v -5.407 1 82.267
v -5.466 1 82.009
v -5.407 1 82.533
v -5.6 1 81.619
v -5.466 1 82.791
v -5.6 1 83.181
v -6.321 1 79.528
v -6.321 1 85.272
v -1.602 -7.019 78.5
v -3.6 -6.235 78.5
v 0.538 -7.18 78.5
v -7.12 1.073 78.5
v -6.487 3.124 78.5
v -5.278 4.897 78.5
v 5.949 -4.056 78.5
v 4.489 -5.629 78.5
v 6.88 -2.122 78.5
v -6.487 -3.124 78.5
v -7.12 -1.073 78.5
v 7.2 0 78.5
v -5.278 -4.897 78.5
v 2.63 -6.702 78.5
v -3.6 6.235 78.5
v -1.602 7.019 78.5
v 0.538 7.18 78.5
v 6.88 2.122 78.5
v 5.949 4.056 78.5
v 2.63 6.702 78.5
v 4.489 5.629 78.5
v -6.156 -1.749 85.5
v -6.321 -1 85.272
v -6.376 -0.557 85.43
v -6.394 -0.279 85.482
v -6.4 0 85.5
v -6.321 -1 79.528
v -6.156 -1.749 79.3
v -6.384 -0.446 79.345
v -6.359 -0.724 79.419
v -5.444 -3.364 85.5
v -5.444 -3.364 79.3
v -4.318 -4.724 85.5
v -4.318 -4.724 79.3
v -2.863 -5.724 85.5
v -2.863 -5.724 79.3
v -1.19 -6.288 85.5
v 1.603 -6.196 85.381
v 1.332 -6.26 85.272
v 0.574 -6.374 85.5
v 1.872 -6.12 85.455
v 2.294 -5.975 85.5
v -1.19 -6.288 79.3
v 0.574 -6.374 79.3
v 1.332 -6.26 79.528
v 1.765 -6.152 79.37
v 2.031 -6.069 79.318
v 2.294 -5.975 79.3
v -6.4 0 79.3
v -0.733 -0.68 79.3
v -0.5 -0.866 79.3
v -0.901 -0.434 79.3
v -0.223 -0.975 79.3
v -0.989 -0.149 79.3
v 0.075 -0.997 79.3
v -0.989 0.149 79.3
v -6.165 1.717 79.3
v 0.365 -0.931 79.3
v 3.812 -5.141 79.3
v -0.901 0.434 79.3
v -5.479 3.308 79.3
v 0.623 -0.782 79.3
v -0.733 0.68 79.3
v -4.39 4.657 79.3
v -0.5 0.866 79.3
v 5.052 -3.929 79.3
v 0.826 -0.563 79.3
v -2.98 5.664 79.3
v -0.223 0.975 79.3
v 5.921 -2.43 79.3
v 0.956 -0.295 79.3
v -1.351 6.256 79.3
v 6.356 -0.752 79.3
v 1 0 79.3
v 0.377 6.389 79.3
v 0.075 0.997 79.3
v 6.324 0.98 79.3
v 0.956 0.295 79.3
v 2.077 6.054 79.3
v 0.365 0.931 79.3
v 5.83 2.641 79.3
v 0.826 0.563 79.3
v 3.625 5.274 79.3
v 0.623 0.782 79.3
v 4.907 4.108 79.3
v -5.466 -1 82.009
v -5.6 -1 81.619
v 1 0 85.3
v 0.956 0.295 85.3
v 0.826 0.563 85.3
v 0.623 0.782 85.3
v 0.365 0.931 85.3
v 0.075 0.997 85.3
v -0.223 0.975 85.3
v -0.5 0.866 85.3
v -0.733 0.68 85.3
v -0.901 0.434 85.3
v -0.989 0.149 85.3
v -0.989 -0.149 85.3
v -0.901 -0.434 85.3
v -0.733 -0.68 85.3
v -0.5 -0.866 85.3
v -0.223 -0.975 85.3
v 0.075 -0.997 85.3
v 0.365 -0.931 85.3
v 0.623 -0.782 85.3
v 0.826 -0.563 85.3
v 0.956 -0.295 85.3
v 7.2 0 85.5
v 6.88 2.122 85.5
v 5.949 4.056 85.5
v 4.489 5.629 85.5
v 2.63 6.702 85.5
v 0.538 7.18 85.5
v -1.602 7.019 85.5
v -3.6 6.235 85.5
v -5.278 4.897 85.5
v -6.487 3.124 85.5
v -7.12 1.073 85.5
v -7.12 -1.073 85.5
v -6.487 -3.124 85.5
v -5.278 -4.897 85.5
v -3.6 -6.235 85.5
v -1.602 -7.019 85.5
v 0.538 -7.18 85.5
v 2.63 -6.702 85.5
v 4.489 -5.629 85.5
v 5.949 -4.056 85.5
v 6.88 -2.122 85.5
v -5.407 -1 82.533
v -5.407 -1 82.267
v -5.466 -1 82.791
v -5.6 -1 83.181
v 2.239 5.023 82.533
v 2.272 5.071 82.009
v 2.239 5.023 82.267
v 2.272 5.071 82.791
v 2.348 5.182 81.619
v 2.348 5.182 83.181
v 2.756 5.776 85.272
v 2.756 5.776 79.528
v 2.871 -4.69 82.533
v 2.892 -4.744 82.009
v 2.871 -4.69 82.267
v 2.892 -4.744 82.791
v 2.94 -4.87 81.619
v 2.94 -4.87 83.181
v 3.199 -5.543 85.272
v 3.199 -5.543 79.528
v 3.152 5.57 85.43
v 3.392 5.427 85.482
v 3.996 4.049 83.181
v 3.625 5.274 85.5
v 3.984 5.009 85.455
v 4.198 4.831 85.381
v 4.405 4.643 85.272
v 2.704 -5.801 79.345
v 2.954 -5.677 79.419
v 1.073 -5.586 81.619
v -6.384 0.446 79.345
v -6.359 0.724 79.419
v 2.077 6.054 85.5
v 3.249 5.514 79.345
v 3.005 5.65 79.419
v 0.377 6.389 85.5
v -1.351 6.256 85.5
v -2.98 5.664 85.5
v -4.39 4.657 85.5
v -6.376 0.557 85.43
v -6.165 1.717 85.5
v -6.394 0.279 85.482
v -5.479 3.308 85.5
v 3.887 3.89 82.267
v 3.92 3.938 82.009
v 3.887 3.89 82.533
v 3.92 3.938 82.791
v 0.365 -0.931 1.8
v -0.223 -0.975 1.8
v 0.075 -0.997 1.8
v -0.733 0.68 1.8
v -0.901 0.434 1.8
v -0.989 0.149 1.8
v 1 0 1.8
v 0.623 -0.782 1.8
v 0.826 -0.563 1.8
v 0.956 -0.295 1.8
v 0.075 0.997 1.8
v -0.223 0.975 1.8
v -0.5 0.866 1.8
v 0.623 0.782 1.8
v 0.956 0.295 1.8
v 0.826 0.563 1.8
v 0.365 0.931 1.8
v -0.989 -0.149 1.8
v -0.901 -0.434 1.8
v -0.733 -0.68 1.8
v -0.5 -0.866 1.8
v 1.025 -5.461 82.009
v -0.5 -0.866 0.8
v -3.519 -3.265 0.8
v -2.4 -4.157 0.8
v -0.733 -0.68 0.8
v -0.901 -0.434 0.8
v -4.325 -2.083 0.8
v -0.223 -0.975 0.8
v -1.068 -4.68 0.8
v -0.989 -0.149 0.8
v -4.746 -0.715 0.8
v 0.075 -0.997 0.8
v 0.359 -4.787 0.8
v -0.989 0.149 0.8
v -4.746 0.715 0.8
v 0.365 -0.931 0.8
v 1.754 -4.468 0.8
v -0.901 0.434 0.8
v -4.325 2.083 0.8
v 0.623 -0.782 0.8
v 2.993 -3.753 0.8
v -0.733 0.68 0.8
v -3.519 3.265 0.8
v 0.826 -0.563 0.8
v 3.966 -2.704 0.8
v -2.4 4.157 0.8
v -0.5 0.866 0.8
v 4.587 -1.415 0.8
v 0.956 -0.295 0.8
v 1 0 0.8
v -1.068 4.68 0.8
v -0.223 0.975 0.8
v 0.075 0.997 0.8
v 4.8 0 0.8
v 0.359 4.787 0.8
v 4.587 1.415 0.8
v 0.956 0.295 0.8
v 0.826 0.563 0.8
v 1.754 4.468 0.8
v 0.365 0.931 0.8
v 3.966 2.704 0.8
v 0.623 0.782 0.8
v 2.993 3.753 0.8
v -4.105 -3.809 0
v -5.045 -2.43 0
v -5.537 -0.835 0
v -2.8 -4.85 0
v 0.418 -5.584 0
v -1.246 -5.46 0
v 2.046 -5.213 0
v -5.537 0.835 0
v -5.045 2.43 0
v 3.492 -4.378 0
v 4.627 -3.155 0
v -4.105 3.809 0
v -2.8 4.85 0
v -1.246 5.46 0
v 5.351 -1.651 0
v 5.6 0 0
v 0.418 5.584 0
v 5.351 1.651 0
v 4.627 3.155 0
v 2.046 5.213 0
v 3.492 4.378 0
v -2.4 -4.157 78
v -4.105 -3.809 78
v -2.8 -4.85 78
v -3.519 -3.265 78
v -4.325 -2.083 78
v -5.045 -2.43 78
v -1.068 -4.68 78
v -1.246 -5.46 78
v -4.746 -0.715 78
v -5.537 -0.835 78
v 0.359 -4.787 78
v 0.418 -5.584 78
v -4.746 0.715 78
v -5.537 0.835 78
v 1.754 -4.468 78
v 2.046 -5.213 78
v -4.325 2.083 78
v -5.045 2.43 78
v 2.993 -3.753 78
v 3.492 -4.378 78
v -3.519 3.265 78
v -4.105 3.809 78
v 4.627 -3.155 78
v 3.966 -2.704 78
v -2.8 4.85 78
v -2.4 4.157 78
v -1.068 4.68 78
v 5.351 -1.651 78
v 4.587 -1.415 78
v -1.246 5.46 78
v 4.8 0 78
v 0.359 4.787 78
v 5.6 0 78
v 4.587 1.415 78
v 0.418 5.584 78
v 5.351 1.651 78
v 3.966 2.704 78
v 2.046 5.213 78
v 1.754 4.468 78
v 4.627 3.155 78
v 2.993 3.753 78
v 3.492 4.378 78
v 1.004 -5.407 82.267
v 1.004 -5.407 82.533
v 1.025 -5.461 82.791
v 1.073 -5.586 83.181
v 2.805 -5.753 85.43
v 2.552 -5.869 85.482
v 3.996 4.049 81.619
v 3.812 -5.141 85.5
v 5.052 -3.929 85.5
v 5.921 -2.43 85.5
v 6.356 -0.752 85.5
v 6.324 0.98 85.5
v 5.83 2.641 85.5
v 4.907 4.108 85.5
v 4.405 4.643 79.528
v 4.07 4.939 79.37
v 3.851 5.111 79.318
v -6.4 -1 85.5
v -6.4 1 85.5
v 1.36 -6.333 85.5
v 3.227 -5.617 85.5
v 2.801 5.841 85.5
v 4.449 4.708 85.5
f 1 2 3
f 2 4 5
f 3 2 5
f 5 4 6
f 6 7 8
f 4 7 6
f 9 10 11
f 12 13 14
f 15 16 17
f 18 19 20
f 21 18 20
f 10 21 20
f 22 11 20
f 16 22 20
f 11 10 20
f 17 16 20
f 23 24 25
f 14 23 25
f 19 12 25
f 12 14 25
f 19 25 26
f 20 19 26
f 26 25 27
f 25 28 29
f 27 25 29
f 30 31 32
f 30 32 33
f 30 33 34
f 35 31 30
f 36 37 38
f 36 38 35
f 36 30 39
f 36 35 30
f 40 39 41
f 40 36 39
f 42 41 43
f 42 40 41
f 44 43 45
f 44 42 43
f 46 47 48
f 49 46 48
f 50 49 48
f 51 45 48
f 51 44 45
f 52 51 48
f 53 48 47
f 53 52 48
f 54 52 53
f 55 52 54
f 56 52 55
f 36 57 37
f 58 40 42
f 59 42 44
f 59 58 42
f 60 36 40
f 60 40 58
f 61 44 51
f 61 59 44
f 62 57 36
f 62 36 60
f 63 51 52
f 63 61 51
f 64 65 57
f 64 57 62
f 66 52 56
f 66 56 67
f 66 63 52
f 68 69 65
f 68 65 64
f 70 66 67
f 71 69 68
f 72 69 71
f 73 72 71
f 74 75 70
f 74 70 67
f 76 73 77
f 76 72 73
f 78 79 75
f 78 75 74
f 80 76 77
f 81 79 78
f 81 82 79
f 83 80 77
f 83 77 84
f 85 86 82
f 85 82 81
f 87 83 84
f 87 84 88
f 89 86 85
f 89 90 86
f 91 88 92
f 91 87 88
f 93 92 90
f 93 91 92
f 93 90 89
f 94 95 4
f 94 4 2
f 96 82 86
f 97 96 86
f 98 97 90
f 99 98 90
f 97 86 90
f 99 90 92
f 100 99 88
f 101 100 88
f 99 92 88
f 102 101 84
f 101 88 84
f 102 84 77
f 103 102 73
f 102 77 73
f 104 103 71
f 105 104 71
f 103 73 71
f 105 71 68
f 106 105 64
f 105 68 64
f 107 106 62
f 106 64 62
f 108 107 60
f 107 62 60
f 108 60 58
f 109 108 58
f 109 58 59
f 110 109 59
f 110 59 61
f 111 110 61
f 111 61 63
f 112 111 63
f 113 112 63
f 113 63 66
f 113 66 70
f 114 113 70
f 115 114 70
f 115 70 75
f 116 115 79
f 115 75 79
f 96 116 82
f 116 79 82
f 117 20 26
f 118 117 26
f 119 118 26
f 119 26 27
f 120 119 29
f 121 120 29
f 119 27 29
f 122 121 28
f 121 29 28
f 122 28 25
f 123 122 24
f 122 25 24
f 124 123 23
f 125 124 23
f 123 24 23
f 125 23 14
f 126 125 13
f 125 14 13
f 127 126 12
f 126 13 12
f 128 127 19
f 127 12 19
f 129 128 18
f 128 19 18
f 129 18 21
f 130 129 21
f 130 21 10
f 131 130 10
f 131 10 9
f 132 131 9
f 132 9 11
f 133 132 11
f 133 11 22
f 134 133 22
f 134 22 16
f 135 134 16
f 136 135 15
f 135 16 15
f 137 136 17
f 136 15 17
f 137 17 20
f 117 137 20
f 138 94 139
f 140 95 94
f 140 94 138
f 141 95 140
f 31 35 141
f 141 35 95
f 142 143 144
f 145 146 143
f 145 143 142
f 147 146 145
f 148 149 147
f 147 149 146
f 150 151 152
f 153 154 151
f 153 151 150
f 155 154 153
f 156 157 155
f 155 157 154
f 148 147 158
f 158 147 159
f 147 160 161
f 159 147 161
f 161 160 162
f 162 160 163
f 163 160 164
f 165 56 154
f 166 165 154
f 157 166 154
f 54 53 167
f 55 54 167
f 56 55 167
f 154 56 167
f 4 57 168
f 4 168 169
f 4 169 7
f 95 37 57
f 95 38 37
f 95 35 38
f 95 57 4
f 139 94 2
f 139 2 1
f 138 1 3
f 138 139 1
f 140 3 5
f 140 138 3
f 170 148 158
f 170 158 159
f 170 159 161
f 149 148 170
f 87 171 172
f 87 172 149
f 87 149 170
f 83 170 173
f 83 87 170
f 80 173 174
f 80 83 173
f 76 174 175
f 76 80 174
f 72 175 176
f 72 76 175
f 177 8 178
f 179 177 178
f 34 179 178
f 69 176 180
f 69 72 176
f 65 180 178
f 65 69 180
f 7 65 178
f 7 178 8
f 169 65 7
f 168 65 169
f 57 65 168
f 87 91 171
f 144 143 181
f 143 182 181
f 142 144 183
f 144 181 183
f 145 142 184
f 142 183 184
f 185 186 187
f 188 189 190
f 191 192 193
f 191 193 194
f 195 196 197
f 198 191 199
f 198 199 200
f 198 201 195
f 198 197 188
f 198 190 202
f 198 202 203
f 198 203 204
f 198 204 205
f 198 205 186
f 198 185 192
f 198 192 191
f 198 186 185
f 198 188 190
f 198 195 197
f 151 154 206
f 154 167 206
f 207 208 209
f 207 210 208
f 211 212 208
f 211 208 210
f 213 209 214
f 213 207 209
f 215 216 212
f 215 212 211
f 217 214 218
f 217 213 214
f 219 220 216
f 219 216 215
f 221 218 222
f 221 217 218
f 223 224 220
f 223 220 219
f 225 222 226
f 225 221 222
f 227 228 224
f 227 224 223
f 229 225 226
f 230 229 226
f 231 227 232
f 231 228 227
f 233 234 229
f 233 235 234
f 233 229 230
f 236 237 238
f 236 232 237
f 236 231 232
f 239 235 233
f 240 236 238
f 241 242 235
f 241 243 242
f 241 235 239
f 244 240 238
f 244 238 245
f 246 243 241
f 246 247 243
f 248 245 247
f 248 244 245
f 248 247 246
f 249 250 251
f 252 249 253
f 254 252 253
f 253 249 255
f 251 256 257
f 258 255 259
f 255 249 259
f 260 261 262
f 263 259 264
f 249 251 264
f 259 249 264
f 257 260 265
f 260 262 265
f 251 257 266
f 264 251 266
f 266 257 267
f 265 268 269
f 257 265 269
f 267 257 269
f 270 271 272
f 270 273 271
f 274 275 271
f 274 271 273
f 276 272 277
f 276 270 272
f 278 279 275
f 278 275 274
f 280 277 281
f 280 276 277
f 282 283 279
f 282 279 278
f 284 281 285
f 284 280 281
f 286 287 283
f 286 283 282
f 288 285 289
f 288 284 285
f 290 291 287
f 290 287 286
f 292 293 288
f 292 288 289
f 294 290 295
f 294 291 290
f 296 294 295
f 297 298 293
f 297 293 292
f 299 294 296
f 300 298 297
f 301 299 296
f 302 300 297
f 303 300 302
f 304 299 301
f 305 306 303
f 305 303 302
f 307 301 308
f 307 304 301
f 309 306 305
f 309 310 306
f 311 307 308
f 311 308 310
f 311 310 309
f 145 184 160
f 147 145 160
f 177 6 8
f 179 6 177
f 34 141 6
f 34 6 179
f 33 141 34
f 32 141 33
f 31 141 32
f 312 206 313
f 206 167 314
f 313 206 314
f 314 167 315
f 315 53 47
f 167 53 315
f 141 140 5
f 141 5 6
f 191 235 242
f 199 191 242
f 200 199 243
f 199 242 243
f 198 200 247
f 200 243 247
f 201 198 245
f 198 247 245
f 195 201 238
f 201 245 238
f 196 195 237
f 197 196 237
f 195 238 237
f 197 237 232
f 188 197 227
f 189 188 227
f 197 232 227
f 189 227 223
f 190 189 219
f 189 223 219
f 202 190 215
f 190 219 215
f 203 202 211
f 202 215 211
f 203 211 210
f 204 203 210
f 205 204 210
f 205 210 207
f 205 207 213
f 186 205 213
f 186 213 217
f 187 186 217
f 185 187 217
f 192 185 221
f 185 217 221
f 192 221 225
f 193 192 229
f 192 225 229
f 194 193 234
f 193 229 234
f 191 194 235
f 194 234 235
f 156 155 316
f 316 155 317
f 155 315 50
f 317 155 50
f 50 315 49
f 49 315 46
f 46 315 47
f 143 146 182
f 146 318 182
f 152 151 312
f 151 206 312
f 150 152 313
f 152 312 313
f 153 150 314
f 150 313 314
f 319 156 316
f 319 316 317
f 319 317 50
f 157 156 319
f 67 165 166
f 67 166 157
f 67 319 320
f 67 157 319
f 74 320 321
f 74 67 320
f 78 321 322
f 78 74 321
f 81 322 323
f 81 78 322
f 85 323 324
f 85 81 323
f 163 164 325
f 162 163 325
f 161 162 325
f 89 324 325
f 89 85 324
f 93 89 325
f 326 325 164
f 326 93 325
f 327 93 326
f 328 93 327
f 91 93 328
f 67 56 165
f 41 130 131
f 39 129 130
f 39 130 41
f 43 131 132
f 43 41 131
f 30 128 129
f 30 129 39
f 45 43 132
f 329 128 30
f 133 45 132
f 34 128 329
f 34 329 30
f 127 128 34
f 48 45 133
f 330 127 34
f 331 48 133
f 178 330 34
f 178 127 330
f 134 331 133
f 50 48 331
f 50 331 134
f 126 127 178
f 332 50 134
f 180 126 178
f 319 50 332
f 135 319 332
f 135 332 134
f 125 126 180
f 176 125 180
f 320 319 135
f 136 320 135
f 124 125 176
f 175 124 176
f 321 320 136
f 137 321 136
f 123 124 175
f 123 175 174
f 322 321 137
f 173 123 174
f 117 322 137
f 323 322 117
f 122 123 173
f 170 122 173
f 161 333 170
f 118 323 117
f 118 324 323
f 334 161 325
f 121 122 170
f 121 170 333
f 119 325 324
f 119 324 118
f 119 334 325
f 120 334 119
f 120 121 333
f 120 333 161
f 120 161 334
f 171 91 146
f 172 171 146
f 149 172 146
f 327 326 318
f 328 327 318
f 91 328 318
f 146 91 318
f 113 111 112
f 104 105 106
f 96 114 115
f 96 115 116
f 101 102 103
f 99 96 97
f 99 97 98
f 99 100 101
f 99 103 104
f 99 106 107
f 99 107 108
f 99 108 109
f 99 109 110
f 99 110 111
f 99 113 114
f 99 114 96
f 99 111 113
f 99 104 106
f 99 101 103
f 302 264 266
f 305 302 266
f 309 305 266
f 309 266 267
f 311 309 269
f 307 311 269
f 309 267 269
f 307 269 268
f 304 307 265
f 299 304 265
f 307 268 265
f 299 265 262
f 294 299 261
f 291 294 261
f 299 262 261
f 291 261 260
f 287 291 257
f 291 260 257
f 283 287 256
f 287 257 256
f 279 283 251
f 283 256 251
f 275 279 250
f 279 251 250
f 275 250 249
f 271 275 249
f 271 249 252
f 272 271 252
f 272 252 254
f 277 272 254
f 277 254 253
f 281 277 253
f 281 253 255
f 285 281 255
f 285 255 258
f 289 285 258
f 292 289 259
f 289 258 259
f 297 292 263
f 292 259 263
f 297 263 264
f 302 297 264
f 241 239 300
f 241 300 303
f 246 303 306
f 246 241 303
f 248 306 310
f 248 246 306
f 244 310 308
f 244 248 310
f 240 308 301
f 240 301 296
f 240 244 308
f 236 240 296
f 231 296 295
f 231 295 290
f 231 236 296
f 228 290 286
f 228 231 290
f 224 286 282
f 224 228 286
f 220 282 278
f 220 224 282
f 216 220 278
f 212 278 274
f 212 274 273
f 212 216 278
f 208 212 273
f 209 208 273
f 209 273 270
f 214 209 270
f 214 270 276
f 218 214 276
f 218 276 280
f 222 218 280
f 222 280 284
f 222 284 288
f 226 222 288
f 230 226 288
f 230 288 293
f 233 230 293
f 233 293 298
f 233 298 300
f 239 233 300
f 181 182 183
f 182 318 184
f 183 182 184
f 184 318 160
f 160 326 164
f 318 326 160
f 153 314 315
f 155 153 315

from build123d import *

# Parameters (mm, degrees)
F0_R             = 5.6
F1_DEPTH         = 78
F2_T             = -0.8
F3_R             = 1
F4_DEPTH         = 1
F6_R             = 7.2
F7_DEPTH         = 7
F8_T             = -0.8
F10_DEPTH        = 1
F10_DEPTH_BACK   = 1
F10_COPIES_COUNT = 3
F10_COPIES_ANGLE = 249
F11_R            = 1
F12_DEPTH        = 6


# Not quite as in the source:
# - a pattern or mirror of a feature is missing from the dataset's text; its kind, count and spacing are read off the source's solid


with BuildPart() as f1:
    # F0 (on Top) → F1 (new body)
    with BuildSketch(Plane.XY):
        Circle(F0_R)
    extrude(amount=F1_DEPTH)

    # F2
    f2_openings = [f1.faces().sort_by_distance(p)[0] for p in [
        (0, 0, 78),
    ]]
    offset(amount=F2_T, openings=f2_openings)

    # F3 (on face) → F4 (join)
    with BuildSketch(Plane.XY.offset(0.8)):
        Circle(F3_R)
    extrude(amount=F4_DEPTH)


with BuildPart() as f7:
    # F6 (on offset) → F7 (new body)
    with BuildSketch(Plane.XY.offset(78.5)):
        Circle(F6_R)
    extrude(amount=F7_DEPTH)

    # F8
    f8_openings = [f7.faces().sort_by_distance(p)[0] for p in [
        (0, 0, 85.5),
    ]]
    offset(amount=F8_T, openings=f8_openings)

    # F9 (on Front) → F10 (join, two sides)
    with BuildSketch(Plane.XZ) as f10_sk:
        Polygon((-6.4, 85.5), (-6.4, 79.3), (-5.6, 81.6190695472), (-5.6, 83.1809304528), align=None)
        with BuildLine():
            Line((-5.6, 83.1809304528), (-5.6, 81.6190695472))
            Line((-5.6, 81.6190695472), (-5.4656007986, 82.0086709162))
            ThreePointArc((-5.4656007986, 82.0086709162), (-5.4, 82.4), (-5.4656007986, 82.7913290838))
            Line((-5.4656007986, 82.7913290838), (-5.6, 83.1809304528))
        make_face()
    f10 = extrude(amount=F10_DEPTH) + extrude(f10_sk.sketch, amount=-F10_DEPTH_BACK)

    # F10_copies: F10 ×3 about axis
    f10_copies_axis = Axis((0, 0, 0), (0, 0, -1))
    for i in range(1, F10_COPIES_COUNT):
        add(f10.rotate(f10_copies_axis, i * F10_COPIES_ANGLE / (F10_COPIES_COUNT - 1)))

    # F11 (on face) → F12 (join)
    with BuildSketch(Plane.XY.offset(79.3)):
        Circle(F11_R)
    extrude(amount=F12_DEPTH)


solid = Compound([f1.part, f7.part])
